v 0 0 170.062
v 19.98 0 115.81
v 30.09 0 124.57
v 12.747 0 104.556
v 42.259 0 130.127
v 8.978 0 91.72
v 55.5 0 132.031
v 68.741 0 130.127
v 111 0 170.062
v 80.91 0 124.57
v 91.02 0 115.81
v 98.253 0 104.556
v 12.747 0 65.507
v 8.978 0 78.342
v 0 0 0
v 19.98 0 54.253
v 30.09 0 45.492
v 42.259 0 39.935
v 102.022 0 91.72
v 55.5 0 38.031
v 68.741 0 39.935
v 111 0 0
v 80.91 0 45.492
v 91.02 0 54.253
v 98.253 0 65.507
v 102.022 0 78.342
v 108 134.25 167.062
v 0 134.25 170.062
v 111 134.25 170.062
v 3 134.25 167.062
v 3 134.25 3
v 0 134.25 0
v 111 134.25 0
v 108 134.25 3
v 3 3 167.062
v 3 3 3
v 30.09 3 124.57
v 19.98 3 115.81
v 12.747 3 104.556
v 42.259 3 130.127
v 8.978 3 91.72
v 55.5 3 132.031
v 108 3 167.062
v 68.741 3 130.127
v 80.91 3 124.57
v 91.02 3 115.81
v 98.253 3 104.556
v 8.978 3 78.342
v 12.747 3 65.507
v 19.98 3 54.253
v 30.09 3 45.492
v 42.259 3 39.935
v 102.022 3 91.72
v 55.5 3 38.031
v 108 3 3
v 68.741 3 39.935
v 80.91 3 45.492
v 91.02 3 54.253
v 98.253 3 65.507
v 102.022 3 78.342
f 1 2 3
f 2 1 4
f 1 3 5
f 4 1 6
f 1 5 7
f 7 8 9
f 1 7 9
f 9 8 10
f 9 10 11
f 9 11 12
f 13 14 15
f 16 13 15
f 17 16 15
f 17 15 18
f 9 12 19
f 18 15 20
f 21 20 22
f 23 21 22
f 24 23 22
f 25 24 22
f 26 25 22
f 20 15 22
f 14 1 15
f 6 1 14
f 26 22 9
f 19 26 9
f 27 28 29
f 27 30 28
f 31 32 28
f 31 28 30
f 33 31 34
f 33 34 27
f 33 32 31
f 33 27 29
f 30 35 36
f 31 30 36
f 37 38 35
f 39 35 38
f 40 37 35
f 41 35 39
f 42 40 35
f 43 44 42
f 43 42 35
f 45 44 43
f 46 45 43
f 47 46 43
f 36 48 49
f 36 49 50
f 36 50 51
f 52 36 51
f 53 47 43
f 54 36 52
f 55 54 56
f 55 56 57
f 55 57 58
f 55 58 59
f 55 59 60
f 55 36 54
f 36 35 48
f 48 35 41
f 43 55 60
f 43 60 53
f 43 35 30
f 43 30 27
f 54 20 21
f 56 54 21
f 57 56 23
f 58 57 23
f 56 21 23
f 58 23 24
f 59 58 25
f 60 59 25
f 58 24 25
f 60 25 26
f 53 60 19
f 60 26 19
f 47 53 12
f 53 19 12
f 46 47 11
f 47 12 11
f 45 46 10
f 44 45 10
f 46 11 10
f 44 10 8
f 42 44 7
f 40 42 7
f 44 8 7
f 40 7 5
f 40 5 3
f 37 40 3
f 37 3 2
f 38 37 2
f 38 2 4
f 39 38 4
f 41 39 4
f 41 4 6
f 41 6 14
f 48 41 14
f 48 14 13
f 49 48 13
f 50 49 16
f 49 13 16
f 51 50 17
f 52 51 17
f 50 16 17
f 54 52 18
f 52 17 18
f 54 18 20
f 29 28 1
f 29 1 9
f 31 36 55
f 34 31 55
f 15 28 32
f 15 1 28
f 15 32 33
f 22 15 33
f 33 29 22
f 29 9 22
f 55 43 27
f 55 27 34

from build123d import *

# Parameters (mm, degrees)
SKETCH1_W           = 111
SKETCH1_H           = 170.0625
BOSS_EXTRUDE1_DEPTH = 3
SKETCH2_W           = 111
SKETCH2_H           = 170.0625
SKETCH2_W_2         = 105
SKETCH2_H_2         = 164.0625
BOSS_EXTRUDE2_DEPTH = 131.25
SKETCH3_R           = 47
CUT_EXTRUDE1_DEPTH  = 3


with BuildPart() as part:
    # Sketch1 → Boss-Extrude1 (new body)
    with BuildSketch(Plane(origin=(0, 0, 0), x_dir=(1, 0, 0), z_dir=(0, 1, 0))):
        with Locations((55.5, -85.03125)):
            Rectangle(SKETCH1_W, SKETCH1_H)
    extrude(amount=BOSS_EXTRUDE1_DEPTH)

    # Sketch2 → Boss-Extrude2 (add)
    with BuildSketch(Plane(origin=(0, 3, 0), x_dir=(1, 0, 0), z_dir=(0, 1, 0))):
        with Locations((55.5, -85.03125)):
            Rectangle(SKETCH2_W, SKETCH2_H)
        with Locations((55.5, -85.03125)):
            Rectangle(SKETCH2_W_2, SKETCH2_H_2, mode=Mode.SUBTRACT)
    extrude(amount=BOSS_EXTRUDE2_DEPTH)

    # Sketch3 → Cut-Extrude1 (cut)
    with BuildSketch(Plane(origin=(0, 0, 0), x_dir=(-1, 0, 0), z_dir=(0, -1, 0))):
        with Locations(Location((-55.5, -85.03125, 0), (0, 0, 90))):
            Circle(SKETCH3_R)
    extrude(amount=-CUT_EXTRUDE1_DEPTH, mode=Mode.SUBTRACT)


solid = part.part
